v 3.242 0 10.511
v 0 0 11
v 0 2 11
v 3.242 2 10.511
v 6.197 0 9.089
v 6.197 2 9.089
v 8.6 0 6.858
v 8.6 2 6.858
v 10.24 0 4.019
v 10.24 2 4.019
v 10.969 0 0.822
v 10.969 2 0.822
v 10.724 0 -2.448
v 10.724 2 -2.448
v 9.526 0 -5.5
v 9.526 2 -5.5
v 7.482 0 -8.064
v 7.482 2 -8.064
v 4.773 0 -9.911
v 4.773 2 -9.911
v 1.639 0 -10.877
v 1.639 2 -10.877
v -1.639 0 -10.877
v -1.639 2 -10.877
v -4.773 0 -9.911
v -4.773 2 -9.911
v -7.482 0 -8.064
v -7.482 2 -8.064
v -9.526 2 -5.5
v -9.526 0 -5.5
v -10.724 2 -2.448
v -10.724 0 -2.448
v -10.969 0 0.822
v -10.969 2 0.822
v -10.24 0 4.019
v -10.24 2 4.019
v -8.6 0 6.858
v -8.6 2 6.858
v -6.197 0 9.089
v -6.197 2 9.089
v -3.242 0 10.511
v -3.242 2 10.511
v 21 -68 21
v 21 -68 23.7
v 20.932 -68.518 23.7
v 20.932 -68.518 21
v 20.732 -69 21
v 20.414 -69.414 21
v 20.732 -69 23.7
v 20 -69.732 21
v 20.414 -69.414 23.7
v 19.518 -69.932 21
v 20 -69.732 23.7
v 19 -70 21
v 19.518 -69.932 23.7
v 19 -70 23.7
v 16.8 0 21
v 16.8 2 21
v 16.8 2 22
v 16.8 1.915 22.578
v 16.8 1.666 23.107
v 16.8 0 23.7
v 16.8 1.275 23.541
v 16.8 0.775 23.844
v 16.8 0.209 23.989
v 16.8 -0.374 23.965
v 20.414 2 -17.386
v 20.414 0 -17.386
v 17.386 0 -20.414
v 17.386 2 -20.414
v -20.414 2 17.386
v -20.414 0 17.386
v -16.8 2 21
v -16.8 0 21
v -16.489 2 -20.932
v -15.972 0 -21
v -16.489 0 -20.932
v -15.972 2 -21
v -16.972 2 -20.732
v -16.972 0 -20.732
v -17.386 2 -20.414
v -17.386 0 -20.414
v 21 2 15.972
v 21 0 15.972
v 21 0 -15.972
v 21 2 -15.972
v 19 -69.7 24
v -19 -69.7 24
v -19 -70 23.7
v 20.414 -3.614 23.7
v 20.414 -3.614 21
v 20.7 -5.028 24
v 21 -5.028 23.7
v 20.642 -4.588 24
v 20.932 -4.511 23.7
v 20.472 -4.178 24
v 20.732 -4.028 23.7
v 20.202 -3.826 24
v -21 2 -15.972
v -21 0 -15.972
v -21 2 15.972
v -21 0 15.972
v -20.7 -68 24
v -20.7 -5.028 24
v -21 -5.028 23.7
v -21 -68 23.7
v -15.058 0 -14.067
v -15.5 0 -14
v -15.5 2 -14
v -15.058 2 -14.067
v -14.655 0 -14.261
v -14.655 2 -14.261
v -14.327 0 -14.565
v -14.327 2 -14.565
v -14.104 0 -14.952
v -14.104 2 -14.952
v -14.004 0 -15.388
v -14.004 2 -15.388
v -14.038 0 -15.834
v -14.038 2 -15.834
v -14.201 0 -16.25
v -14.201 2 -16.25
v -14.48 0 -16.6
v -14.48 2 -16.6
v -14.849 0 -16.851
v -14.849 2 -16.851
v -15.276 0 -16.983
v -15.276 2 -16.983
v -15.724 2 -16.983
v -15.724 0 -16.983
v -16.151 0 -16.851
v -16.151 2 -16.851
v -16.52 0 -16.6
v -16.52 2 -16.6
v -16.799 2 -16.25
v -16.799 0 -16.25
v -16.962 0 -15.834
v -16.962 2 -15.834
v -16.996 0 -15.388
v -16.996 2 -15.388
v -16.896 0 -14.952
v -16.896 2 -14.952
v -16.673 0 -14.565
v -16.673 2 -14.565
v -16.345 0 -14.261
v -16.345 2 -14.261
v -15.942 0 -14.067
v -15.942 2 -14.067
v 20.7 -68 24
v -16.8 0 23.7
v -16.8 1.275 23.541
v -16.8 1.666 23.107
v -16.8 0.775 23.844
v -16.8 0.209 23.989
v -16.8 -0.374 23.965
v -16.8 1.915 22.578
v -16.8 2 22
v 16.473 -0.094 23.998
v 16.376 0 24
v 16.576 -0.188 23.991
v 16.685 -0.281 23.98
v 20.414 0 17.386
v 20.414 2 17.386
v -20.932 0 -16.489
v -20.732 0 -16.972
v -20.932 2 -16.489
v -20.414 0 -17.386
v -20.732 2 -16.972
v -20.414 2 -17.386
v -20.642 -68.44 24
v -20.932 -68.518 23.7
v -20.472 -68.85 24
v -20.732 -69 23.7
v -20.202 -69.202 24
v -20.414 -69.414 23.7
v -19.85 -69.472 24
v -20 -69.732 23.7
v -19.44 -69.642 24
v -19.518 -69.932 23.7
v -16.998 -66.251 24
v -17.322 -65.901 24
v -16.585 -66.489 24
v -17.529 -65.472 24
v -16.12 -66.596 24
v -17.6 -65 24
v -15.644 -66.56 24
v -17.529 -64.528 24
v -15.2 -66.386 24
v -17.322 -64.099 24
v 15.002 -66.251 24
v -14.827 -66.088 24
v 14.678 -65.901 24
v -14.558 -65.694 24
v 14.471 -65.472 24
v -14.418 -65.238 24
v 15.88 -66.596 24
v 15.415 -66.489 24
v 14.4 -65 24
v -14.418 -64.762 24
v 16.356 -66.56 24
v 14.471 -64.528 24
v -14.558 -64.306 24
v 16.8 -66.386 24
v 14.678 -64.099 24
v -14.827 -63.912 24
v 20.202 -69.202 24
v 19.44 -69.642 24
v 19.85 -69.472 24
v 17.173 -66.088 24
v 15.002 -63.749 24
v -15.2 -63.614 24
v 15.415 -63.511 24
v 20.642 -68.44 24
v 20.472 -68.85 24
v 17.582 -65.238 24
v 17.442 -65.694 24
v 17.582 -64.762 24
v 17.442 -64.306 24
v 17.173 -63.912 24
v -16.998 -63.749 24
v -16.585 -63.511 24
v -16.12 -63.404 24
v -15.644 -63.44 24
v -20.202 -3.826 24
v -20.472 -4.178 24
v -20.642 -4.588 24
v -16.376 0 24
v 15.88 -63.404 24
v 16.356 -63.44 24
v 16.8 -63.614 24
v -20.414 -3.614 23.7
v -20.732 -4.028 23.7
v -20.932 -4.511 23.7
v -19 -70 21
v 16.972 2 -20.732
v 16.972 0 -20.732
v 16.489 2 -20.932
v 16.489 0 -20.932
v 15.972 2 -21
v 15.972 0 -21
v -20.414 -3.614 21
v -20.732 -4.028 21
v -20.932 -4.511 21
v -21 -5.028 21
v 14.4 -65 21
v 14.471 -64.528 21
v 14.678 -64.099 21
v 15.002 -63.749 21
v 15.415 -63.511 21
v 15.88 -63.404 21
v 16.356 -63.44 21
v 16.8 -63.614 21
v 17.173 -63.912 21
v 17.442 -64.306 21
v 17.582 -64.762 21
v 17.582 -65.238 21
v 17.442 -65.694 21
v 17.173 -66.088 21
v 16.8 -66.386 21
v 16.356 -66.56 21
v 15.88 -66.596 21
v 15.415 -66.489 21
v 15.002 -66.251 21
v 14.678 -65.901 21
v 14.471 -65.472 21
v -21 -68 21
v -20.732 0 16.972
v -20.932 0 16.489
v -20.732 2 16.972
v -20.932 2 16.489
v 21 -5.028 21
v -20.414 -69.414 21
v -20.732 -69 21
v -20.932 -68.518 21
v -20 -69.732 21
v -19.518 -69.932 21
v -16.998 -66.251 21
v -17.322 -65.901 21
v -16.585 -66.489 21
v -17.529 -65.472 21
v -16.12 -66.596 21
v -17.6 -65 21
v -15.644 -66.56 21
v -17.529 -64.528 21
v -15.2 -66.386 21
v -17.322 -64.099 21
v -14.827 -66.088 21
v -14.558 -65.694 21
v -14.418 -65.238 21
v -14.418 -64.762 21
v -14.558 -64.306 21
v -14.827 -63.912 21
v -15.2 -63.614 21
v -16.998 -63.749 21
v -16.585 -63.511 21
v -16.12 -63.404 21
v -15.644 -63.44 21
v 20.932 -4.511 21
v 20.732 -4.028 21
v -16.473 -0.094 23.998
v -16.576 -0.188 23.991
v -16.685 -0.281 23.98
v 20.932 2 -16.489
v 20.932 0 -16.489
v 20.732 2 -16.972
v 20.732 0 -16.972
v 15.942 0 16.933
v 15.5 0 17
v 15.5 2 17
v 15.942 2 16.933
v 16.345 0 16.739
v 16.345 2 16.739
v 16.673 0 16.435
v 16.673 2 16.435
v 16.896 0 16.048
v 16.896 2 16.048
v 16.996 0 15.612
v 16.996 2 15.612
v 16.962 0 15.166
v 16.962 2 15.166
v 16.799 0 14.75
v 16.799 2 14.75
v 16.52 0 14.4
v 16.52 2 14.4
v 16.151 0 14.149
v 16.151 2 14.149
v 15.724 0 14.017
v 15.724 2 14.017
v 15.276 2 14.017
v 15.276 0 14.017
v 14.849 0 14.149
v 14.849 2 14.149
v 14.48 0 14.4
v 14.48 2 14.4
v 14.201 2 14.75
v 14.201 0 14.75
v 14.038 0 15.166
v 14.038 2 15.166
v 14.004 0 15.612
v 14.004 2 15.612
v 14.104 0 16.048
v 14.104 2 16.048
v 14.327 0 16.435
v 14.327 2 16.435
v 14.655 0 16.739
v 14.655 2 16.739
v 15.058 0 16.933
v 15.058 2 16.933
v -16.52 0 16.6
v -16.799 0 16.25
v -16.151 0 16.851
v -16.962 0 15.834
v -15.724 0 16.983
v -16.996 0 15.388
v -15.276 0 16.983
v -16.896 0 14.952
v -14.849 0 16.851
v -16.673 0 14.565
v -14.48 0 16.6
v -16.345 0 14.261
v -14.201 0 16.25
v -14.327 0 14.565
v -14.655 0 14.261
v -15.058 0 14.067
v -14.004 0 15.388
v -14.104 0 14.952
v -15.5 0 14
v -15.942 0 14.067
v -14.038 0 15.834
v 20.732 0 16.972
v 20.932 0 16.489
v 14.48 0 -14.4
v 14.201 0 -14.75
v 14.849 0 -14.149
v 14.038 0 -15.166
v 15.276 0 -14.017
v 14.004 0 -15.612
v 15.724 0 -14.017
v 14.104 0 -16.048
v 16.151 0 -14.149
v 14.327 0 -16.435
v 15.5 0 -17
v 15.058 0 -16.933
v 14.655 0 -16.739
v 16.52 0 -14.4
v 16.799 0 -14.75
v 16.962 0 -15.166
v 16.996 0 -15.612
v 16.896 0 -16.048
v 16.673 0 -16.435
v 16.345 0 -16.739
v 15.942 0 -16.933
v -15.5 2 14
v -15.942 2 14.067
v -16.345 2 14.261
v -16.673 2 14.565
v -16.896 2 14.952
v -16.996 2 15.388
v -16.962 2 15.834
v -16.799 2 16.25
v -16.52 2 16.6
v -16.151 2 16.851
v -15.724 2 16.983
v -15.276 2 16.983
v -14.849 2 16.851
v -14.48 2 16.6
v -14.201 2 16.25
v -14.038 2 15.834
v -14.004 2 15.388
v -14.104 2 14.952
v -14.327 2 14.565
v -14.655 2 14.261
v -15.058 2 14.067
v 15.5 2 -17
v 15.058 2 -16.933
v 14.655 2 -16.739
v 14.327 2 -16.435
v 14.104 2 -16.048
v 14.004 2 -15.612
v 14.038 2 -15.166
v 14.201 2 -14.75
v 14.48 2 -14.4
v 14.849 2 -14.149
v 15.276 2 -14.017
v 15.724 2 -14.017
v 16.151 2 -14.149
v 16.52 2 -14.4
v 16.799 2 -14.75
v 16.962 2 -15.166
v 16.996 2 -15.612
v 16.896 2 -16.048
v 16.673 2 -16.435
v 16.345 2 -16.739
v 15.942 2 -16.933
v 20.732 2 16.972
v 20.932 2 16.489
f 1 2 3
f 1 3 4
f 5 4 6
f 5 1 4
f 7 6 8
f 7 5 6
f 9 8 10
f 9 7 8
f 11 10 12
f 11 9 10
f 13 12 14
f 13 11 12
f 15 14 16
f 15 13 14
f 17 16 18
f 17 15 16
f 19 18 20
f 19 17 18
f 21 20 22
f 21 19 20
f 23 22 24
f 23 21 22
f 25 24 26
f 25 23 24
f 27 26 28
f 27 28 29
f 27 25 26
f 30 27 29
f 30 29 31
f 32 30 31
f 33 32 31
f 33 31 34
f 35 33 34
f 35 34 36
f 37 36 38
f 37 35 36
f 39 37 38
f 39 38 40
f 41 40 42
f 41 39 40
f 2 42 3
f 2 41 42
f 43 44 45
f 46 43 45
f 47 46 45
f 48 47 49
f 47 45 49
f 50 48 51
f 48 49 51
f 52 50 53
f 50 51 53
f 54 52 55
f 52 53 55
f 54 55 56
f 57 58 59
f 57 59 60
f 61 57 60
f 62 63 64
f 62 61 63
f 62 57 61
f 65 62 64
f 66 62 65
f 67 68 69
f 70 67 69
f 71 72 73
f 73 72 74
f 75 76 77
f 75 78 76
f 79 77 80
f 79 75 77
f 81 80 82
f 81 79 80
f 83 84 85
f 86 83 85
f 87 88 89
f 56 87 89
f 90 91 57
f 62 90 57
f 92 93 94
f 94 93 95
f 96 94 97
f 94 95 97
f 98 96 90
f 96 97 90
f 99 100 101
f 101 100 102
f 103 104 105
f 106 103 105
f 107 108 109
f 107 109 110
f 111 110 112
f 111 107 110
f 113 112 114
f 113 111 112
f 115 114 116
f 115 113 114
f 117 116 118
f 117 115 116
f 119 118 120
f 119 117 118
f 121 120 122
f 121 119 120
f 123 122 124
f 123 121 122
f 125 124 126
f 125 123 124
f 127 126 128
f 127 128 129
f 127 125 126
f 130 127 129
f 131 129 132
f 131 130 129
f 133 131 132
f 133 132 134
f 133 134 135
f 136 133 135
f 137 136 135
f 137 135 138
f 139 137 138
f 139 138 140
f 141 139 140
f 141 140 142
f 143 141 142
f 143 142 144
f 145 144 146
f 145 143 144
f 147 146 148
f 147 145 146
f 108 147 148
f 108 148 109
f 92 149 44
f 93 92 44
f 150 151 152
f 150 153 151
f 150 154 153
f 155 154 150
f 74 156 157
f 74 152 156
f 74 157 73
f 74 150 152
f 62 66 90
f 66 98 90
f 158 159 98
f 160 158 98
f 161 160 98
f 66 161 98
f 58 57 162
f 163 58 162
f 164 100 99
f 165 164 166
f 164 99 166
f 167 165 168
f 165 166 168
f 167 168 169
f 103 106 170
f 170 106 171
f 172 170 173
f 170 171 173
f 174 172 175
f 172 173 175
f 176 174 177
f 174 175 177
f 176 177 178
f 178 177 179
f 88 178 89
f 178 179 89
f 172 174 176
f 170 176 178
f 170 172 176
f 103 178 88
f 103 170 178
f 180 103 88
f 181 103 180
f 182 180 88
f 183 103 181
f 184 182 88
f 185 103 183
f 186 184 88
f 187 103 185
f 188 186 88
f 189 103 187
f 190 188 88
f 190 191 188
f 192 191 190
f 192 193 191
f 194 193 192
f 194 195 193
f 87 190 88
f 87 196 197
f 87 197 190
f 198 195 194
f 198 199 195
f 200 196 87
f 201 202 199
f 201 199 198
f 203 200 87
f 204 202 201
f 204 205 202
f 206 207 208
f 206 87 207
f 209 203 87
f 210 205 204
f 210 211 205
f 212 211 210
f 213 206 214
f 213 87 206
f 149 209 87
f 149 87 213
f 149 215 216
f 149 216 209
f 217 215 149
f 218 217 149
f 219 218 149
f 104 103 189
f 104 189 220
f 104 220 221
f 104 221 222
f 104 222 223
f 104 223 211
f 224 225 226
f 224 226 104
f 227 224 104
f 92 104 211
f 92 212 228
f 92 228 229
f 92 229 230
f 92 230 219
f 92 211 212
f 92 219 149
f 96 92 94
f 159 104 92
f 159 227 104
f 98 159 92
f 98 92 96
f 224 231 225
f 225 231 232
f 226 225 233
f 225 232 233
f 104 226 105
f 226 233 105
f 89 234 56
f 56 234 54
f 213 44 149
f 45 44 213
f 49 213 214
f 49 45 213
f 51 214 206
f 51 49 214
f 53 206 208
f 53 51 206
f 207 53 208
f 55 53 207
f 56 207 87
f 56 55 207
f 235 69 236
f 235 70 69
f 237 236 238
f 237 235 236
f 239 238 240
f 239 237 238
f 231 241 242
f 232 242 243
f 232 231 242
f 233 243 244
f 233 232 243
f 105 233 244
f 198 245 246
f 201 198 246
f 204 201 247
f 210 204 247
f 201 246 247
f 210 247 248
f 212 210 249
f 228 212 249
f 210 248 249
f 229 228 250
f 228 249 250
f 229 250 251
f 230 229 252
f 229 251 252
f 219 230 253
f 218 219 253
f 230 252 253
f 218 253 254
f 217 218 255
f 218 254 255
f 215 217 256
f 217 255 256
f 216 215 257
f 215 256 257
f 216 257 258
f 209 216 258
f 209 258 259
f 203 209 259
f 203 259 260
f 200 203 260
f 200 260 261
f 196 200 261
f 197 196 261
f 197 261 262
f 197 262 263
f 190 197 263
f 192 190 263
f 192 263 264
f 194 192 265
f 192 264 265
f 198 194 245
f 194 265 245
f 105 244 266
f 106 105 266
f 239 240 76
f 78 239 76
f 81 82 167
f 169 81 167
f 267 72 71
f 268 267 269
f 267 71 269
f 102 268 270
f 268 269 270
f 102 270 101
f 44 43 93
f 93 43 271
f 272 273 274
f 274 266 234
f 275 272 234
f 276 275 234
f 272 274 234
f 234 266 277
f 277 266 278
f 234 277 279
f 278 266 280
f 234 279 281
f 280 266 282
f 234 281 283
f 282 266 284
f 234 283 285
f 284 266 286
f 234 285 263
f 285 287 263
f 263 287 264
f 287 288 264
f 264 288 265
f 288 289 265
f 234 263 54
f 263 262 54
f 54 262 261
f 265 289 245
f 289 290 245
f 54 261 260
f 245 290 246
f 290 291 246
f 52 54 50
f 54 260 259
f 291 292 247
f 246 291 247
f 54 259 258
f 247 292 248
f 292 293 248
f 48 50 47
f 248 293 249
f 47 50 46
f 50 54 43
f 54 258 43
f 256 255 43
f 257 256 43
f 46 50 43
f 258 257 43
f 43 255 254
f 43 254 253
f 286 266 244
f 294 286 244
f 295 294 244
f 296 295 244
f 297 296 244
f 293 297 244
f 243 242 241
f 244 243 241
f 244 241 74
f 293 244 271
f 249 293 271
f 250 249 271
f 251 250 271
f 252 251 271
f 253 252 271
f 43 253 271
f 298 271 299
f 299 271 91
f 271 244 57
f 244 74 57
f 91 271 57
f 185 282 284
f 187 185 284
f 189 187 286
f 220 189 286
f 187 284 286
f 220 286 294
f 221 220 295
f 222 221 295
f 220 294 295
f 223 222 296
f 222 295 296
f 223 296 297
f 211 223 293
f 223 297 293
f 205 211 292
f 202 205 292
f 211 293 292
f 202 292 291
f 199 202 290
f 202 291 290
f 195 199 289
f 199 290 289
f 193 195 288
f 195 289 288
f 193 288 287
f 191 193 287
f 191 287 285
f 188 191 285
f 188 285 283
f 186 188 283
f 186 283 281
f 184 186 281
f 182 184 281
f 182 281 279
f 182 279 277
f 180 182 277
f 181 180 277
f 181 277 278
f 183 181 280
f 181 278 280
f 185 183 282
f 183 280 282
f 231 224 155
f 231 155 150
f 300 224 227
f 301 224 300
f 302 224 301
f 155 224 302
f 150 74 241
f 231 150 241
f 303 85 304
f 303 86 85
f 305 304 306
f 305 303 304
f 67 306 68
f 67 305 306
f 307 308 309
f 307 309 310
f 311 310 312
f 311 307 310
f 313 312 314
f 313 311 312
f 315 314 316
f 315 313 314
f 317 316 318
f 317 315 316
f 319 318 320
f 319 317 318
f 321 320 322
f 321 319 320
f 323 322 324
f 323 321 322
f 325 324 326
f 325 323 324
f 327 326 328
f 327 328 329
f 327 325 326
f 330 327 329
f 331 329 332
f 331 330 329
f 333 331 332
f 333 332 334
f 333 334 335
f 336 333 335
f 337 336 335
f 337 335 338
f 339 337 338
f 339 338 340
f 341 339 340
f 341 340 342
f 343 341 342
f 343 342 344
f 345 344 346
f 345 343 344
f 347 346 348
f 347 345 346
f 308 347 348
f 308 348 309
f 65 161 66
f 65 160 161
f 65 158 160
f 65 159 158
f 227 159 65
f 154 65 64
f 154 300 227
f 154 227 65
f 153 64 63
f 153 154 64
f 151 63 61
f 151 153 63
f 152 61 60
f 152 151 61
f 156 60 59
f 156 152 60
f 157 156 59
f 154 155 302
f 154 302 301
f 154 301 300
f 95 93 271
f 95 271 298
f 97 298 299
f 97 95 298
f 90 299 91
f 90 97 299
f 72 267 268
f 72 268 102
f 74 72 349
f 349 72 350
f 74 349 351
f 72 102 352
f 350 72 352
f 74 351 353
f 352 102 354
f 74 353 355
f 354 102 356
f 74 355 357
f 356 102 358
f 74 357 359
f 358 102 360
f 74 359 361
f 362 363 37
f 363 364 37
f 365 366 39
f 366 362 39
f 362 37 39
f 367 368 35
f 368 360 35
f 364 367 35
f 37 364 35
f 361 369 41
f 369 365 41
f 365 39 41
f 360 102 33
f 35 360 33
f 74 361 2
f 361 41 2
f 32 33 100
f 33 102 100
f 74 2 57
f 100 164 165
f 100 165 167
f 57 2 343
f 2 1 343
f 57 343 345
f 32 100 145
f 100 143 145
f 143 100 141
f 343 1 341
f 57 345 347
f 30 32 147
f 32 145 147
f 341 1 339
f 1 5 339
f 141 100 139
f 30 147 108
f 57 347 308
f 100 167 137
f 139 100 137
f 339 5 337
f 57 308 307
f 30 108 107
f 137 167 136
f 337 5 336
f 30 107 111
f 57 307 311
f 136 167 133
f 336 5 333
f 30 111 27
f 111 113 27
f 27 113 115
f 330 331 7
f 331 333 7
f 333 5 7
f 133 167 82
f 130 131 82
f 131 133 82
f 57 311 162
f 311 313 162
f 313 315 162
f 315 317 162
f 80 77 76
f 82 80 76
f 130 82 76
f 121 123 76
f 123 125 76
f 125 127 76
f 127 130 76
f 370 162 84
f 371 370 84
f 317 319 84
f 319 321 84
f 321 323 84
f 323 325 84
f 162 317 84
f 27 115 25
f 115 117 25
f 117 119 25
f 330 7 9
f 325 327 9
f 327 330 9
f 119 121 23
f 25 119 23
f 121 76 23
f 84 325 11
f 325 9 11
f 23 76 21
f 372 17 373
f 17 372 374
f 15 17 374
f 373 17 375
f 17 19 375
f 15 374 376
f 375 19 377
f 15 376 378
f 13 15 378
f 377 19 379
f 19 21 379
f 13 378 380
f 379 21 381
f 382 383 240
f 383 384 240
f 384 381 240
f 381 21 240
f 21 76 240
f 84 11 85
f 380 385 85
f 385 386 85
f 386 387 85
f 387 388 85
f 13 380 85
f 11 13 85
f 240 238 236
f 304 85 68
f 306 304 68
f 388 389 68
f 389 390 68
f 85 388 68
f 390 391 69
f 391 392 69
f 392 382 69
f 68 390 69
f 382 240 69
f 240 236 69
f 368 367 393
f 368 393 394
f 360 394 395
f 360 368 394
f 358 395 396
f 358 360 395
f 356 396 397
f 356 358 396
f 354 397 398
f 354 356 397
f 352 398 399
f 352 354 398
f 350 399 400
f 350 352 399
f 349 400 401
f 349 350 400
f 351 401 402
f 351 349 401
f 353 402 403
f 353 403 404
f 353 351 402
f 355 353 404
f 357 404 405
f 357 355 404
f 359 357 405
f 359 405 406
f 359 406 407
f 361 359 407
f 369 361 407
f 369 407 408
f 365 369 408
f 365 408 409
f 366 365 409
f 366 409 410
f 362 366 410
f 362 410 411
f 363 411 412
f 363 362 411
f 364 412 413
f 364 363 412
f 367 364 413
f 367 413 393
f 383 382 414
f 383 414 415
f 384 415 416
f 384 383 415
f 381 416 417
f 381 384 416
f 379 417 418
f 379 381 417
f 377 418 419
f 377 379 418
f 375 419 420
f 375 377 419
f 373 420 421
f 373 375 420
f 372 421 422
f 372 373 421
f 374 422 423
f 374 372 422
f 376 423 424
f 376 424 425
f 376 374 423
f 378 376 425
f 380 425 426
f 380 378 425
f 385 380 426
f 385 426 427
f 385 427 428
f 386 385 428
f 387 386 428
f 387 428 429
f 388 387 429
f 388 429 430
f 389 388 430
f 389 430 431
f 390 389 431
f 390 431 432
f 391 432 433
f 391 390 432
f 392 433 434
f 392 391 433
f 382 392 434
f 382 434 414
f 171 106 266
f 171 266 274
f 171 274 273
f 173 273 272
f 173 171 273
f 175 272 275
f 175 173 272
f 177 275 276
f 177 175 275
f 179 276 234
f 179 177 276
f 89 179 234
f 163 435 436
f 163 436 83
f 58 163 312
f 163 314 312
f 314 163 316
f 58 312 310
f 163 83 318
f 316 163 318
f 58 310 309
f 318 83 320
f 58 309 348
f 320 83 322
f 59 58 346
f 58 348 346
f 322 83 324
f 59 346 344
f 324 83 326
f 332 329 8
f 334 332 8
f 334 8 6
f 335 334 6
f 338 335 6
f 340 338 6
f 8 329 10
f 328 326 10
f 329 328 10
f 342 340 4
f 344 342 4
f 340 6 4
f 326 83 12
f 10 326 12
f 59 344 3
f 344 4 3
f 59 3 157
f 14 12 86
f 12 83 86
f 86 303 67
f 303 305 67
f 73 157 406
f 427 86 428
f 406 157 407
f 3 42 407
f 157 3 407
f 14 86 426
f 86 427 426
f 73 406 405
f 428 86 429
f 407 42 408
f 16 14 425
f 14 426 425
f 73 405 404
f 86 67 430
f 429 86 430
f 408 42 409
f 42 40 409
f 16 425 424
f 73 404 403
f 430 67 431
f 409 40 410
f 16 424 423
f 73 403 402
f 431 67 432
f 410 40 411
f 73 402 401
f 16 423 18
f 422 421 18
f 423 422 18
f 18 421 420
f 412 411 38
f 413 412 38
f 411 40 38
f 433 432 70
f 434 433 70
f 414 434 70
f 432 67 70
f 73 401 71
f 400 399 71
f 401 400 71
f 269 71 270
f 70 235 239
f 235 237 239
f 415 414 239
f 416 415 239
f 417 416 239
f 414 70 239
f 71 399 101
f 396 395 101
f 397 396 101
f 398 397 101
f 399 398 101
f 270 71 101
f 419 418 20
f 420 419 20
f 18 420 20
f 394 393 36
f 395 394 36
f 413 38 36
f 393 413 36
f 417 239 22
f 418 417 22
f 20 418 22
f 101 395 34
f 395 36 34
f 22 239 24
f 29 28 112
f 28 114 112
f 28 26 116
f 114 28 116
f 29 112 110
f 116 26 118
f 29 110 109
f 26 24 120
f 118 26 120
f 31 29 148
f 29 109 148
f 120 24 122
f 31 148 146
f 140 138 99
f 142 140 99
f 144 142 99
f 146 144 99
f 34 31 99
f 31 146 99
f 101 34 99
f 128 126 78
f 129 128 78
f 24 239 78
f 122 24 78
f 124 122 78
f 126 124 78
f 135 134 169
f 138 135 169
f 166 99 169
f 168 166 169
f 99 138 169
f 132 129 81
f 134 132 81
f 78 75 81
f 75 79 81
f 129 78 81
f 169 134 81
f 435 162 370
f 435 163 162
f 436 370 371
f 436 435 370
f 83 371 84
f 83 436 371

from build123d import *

# Parameters (mm, degrees)
SKETCH_1_R          = 11
SKETCH_1_R_2        = 1.5
EXTRUDE_1_DEPTH     = 2
EXTRUDE_2_DEPTH     = 3
FILLET_1_R          = 2
FILLET_2_R          = 2
FILLET_3_R          = 2
CHAMFER_1_SIZE      = 0.3
SKETCH_3_R          = 1.6
CUT_EXTRUDE_1_DEPTH = 3


with BuildPart() as part:
    # 草图1 → 凸台-拉伸1 (new body)
    with BuildSketch(Plane(origin=(0, 0, 0), x_dir=(1, 0, 0), z_dir=(0, 1, 0))):
        Polygon((16.8, 21), (-16.8, 21), (-21, 16.8), (-21, -16.8), (-16.8, -21), (16.8, -21), (21, -16.8), (21, 16.8), align=None)
        with Locations(Location((0, 0, 0), (0, 0, 270))):
            Circle(SKETCH_1_R, mode=Mode.SUBTRACT)
        with Locations(Location((-15.5, 15.5, 0), (0, 0, 270))):
            Circle(SKETCH_1_R_2, mode=Mode.SUBTRACT)
        with Locations(Location((15.5, 15.5, 0), (0, 0, 90))):
            Circle(SKETCH_1_R_2, mode=Mode.SUBTRACT)
        with Locations(Location((15.5, -15.5, 0), (0, 0, 270))):
            Circle(SKETCH_1_R_2, mode=Mode.SUBTRACT)
        with Locations(Location((-15.5, -15.5, 0), (0, 0, 90))):
            Circle(SKETCH_1_R_2, mode=Mode.SUBTRACT)
    extrude(amount=EXTRUDE_1_DEPTH)

    # 草图2 → 凸台-拉伸2 (add)
    with BuildSketch(Plane.XY.offset(21)):
        Polygon((-21, -70), (21, -70), (21, -4.2), (16.8, 0), (16.8, 2), (-16.8, 2), (-16.8, 0), (-21, -4.2), align=None)
    extrude(amount=EXTRUDE_2_DEPTH)

    # 圆角1
    fillet_1_edges = [part.edges().sort_by_distance(p)[0] for p in [
        (0, 2, 24),
    ]]
    fillet(fillet_1_edges, radius=FILLET_1_R)

    # 圆角2
    fillet_2_edges = [part.edges().sort_by_distance(p)[0] for p in [
        (-21, -70, 22.5),
        (21, -70, 22.5),
    ]]
    fillet(fillet_2_edges, radius=FILLET_2_R)

    # 圆角3
    fillet_3_edges = [part.edges().sort_by_distance(p)[0] for p in [
        (21, 1, -16.8),
        (21, 1, 16.8),
        (-21, 1, 16.8),
        (-21, 1, -16.8),
        (-16.8, 1, -21),
        (16.8, 1, -21),
        (-21, -4.2, 22.5),
        (21, -4.2, 22.5),
    ]]
    fillet(fillet_3_edges, radius=FILLET_3_R)

    # 倒角1
    # the kernel refuses this chamfer: 0.3 mm, written as the material it takes off along each edge
    with BuildSketch(Plane(origin=(20.414213562, -3.614213562, 24), x_dir=(-0.7068394360706586, -0.7068394360706884, 0.027495876610584332), z_dir=(-0.7071067811865624, 0.7071067811865326, 0))) as chamfer_1_piece_1_section:
        Polygon((CHAMFER_1_SIZE * 0.999621916911, -CHAMFER_1_SIZE * 0.0274958766106), (-CHAMFER_1_SIZE * 0.0274958766106, -CHAMFER_1_SIZE * 0.999621916911), (0, 0), align=None)
    chamfer_1_piece_1 = extrude(amount=5.882774734, mode=Mode.PRIVATE)
    chamfer_1_piece_1 = split(chamfer_1_piece_1, bisect_by=Plane(origin=(16.8, -3.46784849, 23.913969067), z_dir=(1, 0, 0)), keep=Keep.TOP, mode=Mode.PRIVATE)
    add(chamfer_1_piece_1, mode=Mode.SUBTRACT)
    with BuildSketch(Plane(origin=(20.414213562, -3.614213562, 24), x_dir=(-0.7068394360706586, -0.7068394360706884, 0.027495876610584332), z_dir=(-0.7071067811865624, 0.7071067811865326, 0))) as chamfer_1_piece_2_section:
        Polygon((CHAMFER_1_SIZE * 0.999621916911, -CHAMFER_1_SIZE * 0.0274958766106), (-CHAMFER_1_SIZE * 0.0274958766106, -CHAMFER_1_SIZE * 0.999621916911), (0, 0), align=None)
    chamfer_1_piece_2 = extrude(amount=5.882774734, mode=Mode.PRIVATE)
    chamfer_1_piece_2 = chamfer_1_piece_2 - Plane(origin=(16.713155259, 0, 22), x_dir=(0, 1, 0), z_dir=(-1, 0, 0)) * Cylinder(2, 13, mode=Mode.PRIVATE)
    add(chamfer_1_piece_2, mode=Mode.SUBTRACT)
    with BuildSketch(Plane(origin=(-21, -5.028427125, 24), x_dir=(0.9996219169112968, 0, 0.027495876610584464), z_dir=(0, -1, 0)), Plane(origin=(21, -68, 24), x_dir=(-0.9996219169112968, 0, 0.027495876610584464), z_dir=(0, 1, 0))) as chamfer_1_piece_3:
        Polygon((CHAMFER_1_SIZE * 0.999621916911, -CHAMFER_1_SIZE * 0.0274958766106), (-CHAMFER_1_SIZE * 0.0274958766106, -CHAMFER_1_SIZE * 0.999621916911), (0, 0), align=None)
    extrude(amount=62.971572875, mode=Mode.SUBTRACT)
    with BuildSketch(Plane(origin=(-19, -5.028427125, 24), x_dir=(-0.7071067811865533, 0.7071067811865418, 0), z_dir=(0.7071067811865418, 0.7071067811865533, 0))) as chamfer_1_piece_4:
        Polygon((2 - CHAMFER_1_SIZE, 0), (2, -CHAMFER_1_SIZE), (2, 0), align=None)
    revolve(axis=Axis((-19, -5.028427125, 24), (0, 0, 1)), revolution_arc=45, mode=Mode.SUBTRACT)
    with BuildSketch(Plane(origin=(19, -5.028427125, 24), x_dir=(1, 0, 0), z_dir=(0, -1, 0))) as chamfer_1_piece_5:
        Polygon((2 - CHAMFER_1_SIZE, 0), (2, -CHAMFER_1_SIZE), (2, 0), align=None)
    revolve(axis=Axis((19, -5.028427125, 24), (0, 0, 1)), revolution_arc=45, mode=Mode.SUBTRACT)
    with BuildSketch(Plane(origin=(-16.254463656, 0.545536344, 24), x_dir=(0.7068394360706796, -0.7068394360706673, 0.027495876610584523), z_dir=(-0.7071067811865415, -0.7071067811865537, 0))) as chamfer_1_piece_6_section:
        Polygon((CHAMFER_1_SIZE * 0.999621916911, -CHAMFER_1_SIZE * 0.0274958766106), (-CHAMFER_1_SIZE * 0.0274958766106, -CHAMFER_1_SIZE * 0.999621916911), (0, 0), align=None)
    chamfer_1_piece_6 = extrude(amount=5.882774734, mode=Mode.PRIVATE)
    chamfer_1_piece_6 = split(chamfer_1_piece_6, bisect_by=Plane(origin=(-16.8, -0.406139504, 23.857619538), z_dir=(-1, 0, 0)), keep=Keep.TOP, mode=Mode.PRIVATE)
    add(chamfer_1_piece_6, mode=Mode.SUBTRACT)
    with BuildSketch(Plane(origin=(-16.254463656, 0.545536344, 24), x_dir=(0.7068394360706796, -0.7068394360706673, 0.027495876610584523), z_dir=(-0.7071067811865415, -0.7071067811865537, 0))) as chamfer_1_piece_7_section:
        Polygon((CHAMFER_1_SIZE * 0.999621916911, -CHAMFER_1_SIZE * 0.0274958766106), (-CHAMFER_1_SIZE * 0.0274958766106, -CHAMFER_1_SIZE * 0.999621916911), (0, 0), align=None)
    chamfer_1_piece_7 = extrude(amount=5.882774734, mode=Mode.PRIVATE)
    chamfer_1_piece_7 = chamfer_1_piece_7 - Plane(origin=(-16.713155259, 0, 22), x_dir=(0, 1, 0), z_dir=(-1, 0, 0)) * Cylinder(2, 13, mode=Mode.PRIVATE)
    add(chamfer_1_piece_7, mode=Mode.SUBTRACT)
    with BuildSketch(Plane(origin=(-19, -70, 24), x_dir=(0, 0.9996219169112968, 0.0274958766105851), z_dir=(1, 0, 0))) as chamfer_1_piece_8:
        Polygon((CHAMFER_1_SIZE * 0.999621916911, -CHAMFER_1_SIZE * 0.0274958766106), (-CHAMFER_1_SIZE * 0.0274958766106, -CHAMFER_1_SIZE * 0.999621916911), (0, 0), align=None)
    extrude(amount=38, mode=Mode.SUBTRACT)
    with BuildSketch(Plane(origin=(19, -68, 24), x_dir=(1, 0, 0), z_dir=(0, 1, 0))) as chamfer_1_piece_9:
        Polygon((2 - CHAMFER_1_SIZE, 0), (2, CHAMFER_1_SIZE), (2, 0), align=None)
    revolve(axis=Axis((19, -68, 24), (0, 0, -1)), revolution_arc=90, mode=Mode.SUBTRACT)
    with BuildSketch(Plane(origin=(-19, -68, 24), x_dir=(-1, 0, 0), z_dir=(0, 1, 0))) as chamfer_1_piece_10:
        Polygon((2 - CHAMFER_1_SIZE, 0), (2, -CHAMFER_1_SIZE), (2, 0), align=None)
    revolve(axis=Axis((-19, -68, 24), (0, 0, 1)), revolution_arc=90, mode=Mode.SUBTRACT)

    # 草图3 → 切除-拉伸1 (cut)
    with BuildSketch(Plane(origin=(0, 0, 21), x_dir=(-1, 0, 0), z_dir=(0, 0, -1))):
        with Locations((-16, -65)):
            Circle(SKETCH_3_R)
        with Locations((16, -65)):
            Circle(SKETCH_3_R)
    extrude(amount=-CUT_EXTRUDE_1_DEPTH, mode=Mode.SUBTRACT)


solid = part.part
